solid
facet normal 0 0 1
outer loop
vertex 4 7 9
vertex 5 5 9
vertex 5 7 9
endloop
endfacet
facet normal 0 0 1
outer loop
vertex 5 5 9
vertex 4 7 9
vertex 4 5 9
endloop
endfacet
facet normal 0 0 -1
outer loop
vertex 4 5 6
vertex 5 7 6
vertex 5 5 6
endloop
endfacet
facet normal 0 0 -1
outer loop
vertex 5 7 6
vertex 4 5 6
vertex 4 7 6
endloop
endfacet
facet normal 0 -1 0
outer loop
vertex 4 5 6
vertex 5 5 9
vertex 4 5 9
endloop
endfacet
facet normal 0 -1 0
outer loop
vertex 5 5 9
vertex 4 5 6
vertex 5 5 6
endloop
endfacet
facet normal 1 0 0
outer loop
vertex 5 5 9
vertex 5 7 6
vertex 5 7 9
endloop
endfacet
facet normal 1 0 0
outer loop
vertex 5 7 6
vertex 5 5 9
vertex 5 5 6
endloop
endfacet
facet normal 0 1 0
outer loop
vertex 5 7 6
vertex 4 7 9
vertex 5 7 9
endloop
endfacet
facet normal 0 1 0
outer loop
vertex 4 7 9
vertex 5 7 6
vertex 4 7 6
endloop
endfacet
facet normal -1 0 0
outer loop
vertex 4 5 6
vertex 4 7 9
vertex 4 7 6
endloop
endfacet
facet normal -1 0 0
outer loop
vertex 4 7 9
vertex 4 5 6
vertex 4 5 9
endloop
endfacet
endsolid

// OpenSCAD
X_Dimension = 1;
Y_Dimension = 2;
Z_Dimension = 3;

X_Offset = 4;
Y_Offset = 5;
Z_Offset = 6;

module mycube(length,width,height,movex,movey,movez) {translate([movex,movey,movez]){cube([length,width,height]);}}

mycube(X_Dimension,Y_Dimension,Z_Dimension,X_Offset,Y_Offset,Z_Offset);
